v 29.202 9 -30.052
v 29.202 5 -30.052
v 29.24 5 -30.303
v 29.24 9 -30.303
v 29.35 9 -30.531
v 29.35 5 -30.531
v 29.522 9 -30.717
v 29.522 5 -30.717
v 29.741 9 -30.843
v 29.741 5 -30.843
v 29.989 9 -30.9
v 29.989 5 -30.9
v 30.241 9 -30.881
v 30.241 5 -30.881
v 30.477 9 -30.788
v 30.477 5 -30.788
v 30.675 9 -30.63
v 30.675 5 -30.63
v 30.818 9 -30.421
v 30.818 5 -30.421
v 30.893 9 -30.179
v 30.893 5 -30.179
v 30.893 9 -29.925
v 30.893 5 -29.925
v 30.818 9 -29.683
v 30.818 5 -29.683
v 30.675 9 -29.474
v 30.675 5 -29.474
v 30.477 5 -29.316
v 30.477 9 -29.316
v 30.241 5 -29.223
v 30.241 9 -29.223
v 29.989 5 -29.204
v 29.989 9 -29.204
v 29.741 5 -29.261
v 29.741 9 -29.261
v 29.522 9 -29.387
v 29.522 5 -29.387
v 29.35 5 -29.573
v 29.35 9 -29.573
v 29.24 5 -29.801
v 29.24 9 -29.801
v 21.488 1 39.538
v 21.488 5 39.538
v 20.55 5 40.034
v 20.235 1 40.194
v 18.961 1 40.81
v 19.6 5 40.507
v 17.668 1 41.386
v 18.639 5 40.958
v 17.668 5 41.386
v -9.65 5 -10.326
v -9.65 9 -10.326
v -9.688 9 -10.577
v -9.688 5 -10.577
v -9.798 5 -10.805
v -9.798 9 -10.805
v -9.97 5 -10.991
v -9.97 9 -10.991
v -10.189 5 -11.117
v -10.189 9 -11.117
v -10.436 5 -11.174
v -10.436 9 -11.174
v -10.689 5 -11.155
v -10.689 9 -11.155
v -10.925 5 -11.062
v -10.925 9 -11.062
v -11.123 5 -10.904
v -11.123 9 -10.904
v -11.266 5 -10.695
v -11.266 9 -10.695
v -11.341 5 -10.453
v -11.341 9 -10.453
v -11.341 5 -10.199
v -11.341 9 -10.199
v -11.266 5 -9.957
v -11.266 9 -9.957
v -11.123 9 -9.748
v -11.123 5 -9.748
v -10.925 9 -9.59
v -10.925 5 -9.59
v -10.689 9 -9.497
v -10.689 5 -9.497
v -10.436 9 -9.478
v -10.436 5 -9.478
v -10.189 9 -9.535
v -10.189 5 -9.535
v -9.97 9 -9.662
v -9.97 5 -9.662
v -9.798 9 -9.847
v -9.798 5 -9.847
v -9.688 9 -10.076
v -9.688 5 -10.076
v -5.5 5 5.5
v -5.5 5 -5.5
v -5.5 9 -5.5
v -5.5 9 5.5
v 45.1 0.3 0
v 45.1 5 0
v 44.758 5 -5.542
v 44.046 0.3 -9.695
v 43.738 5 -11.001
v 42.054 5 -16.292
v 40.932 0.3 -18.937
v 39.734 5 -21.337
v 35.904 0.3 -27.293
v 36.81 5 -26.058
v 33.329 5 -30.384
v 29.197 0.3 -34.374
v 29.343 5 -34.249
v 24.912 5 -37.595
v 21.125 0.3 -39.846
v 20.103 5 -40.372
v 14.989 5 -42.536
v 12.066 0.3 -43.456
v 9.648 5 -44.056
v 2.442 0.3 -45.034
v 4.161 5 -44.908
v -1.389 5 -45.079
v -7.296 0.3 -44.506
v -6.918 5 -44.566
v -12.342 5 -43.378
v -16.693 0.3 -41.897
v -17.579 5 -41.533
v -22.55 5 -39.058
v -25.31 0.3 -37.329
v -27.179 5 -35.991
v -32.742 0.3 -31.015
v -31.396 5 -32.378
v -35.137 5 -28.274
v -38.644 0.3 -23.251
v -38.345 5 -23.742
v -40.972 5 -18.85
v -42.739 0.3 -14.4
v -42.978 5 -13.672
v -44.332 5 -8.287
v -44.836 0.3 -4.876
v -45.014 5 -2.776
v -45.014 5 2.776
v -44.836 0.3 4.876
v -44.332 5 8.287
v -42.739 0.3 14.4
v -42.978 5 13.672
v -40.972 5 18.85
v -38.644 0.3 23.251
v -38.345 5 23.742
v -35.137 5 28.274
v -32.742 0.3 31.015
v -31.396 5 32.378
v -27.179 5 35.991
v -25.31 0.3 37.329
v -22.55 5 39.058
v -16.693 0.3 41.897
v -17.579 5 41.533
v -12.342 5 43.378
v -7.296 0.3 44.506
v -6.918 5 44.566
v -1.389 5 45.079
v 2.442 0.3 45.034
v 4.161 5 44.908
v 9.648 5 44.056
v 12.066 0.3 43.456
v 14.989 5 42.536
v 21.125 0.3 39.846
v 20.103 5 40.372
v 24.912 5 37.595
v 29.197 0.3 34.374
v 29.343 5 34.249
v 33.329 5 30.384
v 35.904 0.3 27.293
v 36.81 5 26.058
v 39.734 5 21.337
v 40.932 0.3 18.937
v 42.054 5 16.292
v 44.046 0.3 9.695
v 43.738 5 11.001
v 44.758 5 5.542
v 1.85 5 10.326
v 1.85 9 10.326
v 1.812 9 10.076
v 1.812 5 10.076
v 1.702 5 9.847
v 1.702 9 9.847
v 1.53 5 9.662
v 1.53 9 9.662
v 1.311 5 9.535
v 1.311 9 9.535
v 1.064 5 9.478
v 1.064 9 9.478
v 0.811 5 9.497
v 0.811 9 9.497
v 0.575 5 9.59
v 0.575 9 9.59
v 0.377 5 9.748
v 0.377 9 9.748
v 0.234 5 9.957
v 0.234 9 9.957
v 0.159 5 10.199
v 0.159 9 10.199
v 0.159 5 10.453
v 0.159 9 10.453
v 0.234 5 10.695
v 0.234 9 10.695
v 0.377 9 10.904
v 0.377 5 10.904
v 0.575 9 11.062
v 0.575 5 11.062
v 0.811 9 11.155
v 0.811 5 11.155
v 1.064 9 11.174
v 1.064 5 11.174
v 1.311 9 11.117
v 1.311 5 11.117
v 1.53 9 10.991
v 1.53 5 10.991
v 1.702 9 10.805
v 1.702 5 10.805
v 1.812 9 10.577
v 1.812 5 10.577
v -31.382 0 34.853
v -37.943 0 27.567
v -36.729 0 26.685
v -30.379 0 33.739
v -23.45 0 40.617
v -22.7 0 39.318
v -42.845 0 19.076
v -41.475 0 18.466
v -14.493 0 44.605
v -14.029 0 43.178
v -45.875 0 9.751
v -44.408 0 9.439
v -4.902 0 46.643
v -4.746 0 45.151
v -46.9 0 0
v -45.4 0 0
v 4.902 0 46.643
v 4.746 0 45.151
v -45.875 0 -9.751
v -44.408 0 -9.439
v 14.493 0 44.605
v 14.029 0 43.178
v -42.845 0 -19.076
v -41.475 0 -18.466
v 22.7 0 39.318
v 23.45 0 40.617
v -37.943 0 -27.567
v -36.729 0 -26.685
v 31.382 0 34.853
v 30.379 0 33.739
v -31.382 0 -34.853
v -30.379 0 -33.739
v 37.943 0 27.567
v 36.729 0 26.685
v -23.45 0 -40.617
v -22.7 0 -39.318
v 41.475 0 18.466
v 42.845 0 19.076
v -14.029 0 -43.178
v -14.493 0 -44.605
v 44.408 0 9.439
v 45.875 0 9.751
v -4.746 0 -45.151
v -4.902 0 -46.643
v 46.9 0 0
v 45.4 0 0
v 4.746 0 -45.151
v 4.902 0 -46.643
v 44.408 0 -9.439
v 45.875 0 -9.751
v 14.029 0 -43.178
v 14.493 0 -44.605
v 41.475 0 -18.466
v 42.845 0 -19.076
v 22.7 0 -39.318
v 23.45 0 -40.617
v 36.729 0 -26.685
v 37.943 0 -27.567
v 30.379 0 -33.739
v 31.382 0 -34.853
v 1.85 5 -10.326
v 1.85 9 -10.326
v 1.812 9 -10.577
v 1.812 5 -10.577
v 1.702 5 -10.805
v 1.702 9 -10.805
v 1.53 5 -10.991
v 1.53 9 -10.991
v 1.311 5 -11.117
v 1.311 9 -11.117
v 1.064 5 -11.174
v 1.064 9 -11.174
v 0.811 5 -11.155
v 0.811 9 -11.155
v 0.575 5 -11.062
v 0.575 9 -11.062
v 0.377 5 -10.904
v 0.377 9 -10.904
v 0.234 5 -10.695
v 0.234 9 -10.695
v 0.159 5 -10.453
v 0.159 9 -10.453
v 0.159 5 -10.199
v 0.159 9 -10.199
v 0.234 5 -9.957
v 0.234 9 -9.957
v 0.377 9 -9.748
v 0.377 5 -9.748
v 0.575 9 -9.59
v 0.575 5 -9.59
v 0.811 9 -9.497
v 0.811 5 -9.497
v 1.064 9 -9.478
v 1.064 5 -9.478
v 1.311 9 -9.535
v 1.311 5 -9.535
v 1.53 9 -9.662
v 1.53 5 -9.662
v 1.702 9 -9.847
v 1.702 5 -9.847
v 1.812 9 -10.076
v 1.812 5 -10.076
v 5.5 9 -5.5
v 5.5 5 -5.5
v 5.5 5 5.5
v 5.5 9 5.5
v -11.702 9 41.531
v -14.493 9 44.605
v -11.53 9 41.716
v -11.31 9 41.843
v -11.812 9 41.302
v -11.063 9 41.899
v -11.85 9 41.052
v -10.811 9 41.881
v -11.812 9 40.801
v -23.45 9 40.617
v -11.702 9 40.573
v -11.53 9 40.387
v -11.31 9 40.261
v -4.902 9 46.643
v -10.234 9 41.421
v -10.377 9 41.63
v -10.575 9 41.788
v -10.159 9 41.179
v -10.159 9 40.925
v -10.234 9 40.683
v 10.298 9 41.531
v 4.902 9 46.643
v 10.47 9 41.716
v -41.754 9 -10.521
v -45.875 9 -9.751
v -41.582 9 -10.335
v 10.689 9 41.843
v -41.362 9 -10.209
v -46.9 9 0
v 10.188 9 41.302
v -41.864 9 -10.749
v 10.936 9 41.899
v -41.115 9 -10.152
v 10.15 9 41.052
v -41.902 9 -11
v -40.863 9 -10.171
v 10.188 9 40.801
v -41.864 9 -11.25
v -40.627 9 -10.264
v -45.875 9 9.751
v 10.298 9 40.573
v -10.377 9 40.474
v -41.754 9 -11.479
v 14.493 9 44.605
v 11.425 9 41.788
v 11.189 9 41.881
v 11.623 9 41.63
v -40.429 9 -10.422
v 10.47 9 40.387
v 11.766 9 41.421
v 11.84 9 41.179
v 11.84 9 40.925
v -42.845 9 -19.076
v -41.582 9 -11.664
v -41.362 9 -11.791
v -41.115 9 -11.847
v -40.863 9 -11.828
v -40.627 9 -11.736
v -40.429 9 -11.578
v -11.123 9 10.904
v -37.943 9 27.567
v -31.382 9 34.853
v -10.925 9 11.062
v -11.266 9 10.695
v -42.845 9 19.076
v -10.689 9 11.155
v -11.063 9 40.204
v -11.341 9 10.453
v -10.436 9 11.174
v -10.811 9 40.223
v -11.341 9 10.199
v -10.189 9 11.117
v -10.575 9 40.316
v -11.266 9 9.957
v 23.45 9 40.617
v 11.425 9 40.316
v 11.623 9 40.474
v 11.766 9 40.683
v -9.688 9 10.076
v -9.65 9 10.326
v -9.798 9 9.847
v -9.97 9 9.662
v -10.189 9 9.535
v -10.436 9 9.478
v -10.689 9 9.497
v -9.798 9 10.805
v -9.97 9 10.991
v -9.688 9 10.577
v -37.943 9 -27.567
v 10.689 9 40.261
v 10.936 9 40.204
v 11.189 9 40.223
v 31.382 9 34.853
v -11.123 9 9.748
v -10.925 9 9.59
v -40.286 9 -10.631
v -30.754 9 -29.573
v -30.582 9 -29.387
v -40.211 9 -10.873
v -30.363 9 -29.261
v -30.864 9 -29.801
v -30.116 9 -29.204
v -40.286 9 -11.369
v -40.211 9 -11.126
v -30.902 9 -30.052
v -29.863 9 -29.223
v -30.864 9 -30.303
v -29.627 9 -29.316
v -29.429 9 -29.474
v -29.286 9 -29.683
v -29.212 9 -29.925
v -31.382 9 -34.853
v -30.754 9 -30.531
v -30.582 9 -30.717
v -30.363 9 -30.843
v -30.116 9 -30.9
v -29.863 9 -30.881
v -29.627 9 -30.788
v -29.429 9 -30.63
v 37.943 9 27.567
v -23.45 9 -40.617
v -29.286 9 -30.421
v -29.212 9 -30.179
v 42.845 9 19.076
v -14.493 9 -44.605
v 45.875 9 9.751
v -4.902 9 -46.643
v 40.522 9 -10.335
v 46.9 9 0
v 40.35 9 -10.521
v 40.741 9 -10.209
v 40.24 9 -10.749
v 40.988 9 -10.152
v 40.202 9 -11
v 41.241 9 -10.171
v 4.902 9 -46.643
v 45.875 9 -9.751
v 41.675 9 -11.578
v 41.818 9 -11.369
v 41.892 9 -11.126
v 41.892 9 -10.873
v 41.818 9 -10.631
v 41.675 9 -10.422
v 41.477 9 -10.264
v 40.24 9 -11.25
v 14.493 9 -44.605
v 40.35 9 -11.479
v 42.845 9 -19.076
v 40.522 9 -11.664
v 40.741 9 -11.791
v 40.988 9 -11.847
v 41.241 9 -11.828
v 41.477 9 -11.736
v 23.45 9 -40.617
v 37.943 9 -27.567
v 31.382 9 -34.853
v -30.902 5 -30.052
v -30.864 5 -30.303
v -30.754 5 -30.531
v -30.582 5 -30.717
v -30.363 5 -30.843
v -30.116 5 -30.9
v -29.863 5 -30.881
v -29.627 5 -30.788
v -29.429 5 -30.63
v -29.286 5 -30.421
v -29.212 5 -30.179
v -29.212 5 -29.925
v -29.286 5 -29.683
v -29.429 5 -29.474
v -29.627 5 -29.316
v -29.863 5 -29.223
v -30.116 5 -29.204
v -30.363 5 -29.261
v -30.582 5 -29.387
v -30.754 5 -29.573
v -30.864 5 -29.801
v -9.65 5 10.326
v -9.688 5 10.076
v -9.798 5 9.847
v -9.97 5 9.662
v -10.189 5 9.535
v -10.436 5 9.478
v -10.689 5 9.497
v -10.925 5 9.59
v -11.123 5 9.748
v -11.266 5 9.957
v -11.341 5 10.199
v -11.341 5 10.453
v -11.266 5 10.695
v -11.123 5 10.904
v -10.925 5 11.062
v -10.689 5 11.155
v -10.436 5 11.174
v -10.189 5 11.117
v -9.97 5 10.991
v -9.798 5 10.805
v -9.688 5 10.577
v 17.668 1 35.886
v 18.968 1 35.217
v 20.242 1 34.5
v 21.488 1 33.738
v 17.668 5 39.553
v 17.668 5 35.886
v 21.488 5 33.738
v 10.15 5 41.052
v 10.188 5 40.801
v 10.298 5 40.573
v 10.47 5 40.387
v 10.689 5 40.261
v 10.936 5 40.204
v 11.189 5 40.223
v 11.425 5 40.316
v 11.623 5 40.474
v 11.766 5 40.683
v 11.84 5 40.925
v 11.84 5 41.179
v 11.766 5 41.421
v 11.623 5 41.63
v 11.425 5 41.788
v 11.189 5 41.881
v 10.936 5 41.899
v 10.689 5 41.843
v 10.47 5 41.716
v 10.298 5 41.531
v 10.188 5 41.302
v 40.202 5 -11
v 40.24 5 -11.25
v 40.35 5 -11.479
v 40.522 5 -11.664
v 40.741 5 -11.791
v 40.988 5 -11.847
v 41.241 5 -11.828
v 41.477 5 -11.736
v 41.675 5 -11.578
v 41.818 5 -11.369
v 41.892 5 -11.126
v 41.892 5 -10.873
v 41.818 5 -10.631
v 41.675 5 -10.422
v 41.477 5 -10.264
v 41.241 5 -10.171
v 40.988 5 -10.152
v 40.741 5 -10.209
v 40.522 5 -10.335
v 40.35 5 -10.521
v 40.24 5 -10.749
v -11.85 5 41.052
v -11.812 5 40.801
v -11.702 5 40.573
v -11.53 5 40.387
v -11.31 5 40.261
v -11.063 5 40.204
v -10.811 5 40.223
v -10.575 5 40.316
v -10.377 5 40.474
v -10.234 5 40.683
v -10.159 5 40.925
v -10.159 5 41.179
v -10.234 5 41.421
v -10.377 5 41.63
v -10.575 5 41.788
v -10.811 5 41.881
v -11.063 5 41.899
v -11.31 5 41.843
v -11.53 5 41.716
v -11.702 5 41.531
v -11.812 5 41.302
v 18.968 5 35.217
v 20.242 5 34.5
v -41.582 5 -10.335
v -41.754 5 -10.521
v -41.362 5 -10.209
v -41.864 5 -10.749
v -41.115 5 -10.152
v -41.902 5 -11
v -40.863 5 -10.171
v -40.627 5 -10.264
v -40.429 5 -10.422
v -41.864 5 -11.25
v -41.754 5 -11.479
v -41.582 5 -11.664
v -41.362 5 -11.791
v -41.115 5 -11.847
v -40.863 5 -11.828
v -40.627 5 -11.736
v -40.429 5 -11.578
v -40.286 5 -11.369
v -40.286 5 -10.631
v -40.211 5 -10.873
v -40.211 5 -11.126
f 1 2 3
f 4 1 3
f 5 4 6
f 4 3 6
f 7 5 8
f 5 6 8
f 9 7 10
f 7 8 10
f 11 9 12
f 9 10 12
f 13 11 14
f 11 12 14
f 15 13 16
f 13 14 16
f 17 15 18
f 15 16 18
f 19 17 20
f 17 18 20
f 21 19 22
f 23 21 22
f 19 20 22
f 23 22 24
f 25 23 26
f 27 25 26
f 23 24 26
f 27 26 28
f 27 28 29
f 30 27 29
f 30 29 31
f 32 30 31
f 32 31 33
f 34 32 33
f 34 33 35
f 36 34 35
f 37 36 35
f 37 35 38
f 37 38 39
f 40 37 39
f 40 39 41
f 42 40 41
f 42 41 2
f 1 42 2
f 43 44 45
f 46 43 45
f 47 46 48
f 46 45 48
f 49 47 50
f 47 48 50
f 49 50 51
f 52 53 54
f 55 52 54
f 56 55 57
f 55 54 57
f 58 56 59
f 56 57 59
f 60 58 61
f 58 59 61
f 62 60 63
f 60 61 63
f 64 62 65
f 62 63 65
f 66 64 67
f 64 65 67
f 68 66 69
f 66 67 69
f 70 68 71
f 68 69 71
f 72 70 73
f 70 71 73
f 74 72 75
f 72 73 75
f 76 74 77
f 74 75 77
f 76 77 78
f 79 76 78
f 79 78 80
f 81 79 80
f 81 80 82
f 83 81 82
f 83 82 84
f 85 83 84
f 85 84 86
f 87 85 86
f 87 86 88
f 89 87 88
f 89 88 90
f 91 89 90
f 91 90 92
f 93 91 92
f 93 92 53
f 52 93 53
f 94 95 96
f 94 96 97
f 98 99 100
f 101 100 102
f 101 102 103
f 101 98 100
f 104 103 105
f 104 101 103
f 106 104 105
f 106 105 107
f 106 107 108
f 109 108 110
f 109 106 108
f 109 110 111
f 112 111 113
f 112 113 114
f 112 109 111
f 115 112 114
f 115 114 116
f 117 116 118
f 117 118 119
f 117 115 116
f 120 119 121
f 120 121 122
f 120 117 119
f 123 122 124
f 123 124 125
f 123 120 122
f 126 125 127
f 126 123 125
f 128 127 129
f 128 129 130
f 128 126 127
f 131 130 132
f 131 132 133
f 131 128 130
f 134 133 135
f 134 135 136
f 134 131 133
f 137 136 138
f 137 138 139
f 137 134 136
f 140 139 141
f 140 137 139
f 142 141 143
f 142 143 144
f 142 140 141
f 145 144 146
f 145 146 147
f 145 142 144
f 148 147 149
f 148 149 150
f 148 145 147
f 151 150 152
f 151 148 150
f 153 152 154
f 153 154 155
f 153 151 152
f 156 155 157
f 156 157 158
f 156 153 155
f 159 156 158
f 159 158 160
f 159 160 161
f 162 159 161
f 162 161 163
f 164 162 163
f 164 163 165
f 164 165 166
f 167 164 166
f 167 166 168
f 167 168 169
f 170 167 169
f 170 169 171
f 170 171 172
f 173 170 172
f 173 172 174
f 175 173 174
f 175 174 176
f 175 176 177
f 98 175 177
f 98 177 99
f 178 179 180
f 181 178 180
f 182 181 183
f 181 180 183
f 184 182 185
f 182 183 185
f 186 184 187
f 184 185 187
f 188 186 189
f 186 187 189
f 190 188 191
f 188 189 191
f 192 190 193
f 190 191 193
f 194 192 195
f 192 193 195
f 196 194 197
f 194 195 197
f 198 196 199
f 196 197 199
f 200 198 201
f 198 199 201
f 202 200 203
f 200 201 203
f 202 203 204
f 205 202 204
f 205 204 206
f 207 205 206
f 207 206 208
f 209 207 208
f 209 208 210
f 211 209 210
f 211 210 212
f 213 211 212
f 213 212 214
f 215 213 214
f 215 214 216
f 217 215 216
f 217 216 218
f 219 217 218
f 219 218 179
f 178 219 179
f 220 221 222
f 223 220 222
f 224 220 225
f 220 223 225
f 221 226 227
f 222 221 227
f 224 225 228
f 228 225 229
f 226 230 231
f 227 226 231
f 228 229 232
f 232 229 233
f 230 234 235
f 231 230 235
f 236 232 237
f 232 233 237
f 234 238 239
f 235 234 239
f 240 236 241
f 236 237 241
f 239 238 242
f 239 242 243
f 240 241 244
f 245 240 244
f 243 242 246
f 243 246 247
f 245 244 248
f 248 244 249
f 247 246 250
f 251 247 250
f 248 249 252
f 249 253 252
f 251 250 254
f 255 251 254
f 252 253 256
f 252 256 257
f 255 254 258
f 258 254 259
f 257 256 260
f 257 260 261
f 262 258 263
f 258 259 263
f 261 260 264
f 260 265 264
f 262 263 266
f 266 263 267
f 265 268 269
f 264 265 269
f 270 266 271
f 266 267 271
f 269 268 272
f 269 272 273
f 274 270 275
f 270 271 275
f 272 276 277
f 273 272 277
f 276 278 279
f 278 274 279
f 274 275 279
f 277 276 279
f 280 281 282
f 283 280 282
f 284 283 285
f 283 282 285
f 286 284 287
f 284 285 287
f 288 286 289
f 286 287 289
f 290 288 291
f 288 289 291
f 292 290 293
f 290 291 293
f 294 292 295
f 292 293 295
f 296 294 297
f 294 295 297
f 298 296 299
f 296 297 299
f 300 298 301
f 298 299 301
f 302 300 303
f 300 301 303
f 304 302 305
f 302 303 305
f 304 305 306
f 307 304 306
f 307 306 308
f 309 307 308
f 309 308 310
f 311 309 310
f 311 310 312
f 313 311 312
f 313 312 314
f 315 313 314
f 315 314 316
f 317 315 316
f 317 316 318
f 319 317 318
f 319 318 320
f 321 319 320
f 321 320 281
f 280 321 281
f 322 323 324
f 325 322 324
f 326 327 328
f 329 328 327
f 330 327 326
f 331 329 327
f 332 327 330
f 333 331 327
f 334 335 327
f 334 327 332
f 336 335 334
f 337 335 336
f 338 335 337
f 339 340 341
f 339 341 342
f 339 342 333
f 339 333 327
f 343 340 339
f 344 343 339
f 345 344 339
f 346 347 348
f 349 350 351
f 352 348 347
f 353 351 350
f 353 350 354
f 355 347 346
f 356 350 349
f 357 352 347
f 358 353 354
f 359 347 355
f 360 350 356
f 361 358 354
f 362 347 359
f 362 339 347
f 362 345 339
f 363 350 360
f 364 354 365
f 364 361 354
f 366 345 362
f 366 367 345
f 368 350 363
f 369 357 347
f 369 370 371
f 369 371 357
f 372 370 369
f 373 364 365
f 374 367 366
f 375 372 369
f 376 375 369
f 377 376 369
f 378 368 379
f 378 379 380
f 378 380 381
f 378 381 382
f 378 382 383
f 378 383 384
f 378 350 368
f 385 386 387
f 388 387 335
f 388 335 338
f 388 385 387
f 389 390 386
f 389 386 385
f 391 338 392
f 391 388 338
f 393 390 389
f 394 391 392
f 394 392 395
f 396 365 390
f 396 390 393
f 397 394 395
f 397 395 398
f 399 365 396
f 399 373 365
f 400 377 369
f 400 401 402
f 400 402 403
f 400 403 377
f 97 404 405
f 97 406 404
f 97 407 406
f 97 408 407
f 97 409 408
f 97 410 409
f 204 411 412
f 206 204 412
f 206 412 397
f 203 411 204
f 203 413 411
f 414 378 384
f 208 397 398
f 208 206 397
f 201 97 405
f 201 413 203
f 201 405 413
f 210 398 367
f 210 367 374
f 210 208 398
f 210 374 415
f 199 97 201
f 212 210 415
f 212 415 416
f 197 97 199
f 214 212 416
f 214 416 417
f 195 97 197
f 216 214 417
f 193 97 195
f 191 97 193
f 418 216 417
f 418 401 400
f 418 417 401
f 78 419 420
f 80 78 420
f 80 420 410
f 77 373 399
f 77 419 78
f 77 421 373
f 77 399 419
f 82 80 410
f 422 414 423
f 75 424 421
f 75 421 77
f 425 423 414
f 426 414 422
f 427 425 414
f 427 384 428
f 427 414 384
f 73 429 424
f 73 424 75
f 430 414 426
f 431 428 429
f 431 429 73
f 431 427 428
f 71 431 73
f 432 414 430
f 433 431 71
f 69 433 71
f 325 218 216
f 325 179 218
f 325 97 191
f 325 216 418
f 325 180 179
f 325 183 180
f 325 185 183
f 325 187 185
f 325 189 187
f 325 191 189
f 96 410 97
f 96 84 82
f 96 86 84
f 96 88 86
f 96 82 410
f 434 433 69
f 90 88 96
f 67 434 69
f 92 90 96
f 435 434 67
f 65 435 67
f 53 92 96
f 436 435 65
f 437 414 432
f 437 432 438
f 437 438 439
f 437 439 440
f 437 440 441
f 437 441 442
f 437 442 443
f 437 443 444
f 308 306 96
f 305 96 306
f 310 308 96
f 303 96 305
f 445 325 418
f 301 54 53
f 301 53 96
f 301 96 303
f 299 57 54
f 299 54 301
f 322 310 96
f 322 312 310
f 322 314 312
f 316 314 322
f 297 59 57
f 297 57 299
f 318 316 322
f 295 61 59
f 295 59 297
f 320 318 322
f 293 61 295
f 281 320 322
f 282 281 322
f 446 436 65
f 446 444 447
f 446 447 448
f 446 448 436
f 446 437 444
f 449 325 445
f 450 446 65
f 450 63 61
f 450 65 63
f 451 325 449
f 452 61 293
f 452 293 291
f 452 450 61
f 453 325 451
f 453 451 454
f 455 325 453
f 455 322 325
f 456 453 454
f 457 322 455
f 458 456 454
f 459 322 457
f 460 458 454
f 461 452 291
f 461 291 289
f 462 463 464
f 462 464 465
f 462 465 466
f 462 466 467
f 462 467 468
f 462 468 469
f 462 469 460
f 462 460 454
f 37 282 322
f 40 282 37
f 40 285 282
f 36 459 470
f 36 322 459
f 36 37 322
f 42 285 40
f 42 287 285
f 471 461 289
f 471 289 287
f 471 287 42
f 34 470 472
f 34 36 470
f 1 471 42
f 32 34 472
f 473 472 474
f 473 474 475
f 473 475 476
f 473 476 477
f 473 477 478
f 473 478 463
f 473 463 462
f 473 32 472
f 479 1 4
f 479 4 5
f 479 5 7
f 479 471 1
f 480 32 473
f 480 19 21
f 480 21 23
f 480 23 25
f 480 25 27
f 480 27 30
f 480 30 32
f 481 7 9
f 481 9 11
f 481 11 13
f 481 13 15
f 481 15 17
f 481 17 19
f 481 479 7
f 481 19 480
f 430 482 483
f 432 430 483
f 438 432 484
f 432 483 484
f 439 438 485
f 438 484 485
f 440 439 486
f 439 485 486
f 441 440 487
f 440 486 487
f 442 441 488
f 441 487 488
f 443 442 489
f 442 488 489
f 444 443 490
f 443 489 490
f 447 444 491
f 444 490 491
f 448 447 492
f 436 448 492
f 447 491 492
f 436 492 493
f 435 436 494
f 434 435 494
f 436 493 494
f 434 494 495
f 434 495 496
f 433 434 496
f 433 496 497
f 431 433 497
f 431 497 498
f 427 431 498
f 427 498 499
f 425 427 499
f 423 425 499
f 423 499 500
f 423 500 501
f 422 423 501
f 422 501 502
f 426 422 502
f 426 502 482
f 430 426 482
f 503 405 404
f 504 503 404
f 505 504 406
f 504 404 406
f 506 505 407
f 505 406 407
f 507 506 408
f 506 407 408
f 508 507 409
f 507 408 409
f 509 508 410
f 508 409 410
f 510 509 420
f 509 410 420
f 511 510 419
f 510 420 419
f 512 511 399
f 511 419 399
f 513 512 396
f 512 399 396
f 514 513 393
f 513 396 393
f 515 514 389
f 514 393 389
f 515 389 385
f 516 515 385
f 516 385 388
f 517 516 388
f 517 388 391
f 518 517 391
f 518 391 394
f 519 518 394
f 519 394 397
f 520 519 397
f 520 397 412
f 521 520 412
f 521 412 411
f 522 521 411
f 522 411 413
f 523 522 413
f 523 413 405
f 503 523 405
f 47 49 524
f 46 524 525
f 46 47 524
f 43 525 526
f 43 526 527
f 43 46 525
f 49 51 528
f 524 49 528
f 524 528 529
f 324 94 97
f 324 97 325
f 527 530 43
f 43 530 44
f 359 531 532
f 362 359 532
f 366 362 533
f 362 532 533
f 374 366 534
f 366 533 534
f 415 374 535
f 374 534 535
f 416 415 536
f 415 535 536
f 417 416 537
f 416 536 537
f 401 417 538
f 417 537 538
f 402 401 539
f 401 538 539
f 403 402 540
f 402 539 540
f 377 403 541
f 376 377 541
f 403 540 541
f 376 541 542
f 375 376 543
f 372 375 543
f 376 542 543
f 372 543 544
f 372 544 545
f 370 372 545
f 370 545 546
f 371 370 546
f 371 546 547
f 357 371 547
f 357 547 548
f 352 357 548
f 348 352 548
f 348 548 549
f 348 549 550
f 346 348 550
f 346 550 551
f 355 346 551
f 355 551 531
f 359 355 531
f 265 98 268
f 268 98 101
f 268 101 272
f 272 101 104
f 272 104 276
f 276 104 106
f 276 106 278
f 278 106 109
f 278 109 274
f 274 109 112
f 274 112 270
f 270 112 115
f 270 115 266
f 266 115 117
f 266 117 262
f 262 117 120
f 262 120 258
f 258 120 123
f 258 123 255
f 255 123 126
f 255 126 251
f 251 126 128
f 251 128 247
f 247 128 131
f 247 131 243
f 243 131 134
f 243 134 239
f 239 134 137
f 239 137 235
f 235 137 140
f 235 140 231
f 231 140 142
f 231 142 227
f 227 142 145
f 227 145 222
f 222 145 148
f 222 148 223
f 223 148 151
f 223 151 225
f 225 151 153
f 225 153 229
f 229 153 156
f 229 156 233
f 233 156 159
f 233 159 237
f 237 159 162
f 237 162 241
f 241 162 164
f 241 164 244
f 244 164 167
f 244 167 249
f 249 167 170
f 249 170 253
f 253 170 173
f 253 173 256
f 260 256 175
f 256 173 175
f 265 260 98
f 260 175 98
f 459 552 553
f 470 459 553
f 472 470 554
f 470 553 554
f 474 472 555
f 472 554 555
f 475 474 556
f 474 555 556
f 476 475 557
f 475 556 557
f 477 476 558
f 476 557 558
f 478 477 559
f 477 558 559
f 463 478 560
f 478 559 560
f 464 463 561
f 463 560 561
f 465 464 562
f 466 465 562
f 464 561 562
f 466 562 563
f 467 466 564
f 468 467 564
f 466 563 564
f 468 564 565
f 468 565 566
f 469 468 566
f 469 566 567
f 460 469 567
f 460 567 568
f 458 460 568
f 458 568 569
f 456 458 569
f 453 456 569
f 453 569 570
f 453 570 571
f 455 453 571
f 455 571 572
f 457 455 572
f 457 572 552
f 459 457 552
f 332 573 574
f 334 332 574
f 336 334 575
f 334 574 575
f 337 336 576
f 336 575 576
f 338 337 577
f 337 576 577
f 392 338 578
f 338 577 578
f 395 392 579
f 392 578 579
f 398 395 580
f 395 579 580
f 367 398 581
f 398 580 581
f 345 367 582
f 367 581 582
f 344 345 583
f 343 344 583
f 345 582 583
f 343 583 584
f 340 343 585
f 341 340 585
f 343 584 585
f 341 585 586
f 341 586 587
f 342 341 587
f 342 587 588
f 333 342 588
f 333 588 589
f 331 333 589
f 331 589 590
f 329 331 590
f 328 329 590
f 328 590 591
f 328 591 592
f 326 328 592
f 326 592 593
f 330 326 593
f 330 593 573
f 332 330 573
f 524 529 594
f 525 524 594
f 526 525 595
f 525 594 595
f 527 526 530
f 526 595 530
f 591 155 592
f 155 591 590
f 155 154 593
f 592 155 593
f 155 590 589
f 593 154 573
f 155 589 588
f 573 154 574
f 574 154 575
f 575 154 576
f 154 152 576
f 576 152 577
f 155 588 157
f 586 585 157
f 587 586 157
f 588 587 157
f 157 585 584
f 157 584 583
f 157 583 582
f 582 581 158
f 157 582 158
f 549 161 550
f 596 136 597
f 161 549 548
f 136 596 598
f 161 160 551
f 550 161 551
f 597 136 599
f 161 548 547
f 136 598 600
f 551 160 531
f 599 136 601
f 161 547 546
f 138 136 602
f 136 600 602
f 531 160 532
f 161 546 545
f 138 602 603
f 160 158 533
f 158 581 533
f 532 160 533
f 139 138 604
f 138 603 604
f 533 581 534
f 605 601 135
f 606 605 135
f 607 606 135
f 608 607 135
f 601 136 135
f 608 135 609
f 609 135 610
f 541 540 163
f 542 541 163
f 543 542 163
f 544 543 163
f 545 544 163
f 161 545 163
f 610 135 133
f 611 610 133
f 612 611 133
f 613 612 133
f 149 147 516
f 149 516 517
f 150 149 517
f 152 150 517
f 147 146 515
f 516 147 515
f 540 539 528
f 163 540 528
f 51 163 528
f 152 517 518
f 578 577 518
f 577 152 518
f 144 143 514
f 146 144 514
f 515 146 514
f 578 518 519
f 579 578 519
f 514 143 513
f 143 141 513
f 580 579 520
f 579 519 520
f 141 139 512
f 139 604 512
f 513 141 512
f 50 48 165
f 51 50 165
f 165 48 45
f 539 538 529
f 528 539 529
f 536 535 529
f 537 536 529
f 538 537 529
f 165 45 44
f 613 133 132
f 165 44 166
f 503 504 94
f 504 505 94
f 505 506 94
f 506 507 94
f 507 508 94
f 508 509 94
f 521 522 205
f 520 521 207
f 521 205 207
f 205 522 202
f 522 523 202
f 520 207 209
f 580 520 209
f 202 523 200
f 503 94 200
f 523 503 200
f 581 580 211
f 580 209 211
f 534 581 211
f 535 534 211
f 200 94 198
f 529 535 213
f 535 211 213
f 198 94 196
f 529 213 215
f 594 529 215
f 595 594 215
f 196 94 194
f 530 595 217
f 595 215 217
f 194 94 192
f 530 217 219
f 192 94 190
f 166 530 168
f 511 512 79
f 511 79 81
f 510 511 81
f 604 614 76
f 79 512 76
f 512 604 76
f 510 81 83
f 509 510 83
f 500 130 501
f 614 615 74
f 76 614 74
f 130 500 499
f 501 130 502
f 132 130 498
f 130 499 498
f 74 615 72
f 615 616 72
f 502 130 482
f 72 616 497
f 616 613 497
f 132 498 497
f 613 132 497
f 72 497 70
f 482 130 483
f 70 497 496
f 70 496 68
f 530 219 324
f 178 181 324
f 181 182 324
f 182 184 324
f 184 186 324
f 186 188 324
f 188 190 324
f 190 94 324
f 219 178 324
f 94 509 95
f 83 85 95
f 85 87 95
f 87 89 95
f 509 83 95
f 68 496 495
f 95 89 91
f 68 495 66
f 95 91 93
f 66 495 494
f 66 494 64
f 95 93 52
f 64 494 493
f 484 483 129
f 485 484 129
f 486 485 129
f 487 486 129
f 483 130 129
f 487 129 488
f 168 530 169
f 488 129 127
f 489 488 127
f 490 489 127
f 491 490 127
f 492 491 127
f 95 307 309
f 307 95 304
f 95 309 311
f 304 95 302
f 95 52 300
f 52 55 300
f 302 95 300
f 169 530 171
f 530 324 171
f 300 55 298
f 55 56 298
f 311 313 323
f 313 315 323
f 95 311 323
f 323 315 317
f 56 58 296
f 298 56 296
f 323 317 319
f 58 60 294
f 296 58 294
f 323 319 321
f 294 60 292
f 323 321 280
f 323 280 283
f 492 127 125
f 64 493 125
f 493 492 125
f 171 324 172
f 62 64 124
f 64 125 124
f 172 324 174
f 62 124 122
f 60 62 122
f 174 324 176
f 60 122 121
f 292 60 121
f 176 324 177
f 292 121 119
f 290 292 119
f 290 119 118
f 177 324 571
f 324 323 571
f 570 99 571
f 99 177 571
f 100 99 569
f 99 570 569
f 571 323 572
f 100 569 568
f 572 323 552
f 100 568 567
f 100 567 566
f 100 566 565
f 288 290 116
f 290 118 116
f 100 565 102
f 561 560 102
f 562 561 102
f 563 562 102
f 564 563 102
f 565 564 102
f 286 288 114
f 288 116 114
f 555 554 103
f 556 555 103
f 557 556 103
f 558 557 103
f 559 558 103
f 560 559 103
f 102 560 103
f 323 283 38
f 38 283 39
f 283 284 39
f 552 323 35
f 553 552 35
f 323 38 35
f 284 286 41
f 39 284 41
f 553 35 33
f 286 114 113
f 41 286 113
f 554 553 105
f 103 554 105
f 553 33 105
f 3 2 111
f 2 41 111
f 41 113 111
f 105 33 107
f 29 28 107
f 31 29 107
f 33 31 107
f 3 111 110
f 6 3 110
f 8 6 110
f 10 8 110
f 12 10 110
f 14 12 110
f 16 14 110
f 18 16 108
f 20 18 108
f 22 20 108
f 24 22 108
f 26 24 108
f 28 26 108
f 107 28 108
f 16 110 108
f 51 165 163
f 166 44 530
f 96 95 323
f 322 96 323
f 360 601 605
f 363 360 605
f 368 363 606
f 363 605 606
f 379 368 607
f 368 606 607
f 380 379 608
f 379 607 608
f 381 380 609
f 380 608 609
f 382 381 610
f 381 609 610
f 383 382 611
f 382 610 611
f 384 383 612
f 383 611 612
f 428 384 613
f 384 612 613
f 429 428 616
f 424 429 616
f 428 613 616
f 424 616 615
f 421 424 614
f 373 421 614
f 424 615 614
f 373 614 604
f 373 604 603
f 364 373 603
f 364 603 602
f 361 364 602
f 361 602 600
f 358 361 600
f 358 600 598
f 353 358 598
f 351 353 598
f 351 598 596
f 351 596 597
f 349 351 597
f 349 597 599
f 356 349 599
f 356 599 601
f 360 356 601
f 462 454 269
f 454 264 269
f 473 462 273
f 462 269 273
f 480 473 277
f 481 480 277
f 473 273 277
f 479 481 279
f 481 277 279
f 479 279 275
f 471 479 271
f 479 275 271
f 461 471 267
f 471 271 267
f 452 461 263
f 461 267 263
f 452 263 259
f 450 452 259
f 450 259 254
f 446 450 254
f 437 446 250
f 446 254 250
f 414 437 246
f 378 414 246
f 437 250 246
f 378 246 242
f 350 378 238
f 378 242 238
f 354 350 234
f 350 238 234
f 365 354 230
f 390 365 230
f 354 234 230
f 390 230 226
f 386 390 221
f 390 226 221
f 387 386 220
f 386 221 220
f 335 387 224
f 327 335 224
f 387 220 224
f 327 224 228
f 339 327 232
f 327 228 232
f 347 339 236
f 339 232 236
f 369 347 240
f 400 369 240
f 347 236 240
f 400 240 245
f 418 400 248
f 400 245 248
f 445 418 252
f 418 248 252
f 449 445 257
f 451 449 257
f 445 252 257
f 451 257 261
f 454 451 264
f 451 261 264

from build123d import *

# Parameters (mm, degrees)
SKETCH_1_R          = 46.9
SKETCH_1_R_2        = 45.1
EXTRUDE_2_DEPTH     = 5
SKETCH_2_R          = 46.9
EXTRUDE_1_DEPTH     = 4
SKETCH_4_W          = 11
SKETCH_4_H          = 11
CUT_EXTRUDE_1_DEPTH = 67.514810381
HOLE_WIZARD_2_D     = 1.7
HOLE_WIZARD_2_DEPTH = 4.4
CHAMFER_1_SIZE      = 0.3
HOLE_WIZARD_1_D     = 1.7
EXTRUDE_2_2_DEPTH   = 4


with BuildPart() as part:
    # 草图1 → Extrude 2 (new body)
    with BuildSketch(Plane(origin=(0, 0, 0), x_dir=(1, 0, 0), z_dir=(0, 1, 0))):
        Circle(SKETCH_1_R)
        Circle(SKETCH_1_R_2, mode=Mode.SUBTRACT)
    extrude(amount=EXTRUDE_2_DEPTH)

    # 草图2 → 凸台-拉伸1 (add)
    with BuildSketch(Plane(origin=(0, 5, 0), x_dir=(1, 0, 0), z_dir=(0, 1, 0))):
        Circle(SKETCH_2_R)
    extrude(amount=EXTRUDE_1_DEPTH)

    # 草图4 → 切除-拉伸1 (cut, through all)
    with BuildSketch(Plane.XZ.offset(-5)):
        Rectangle(SKETCH_4_W, SKETCH_4_H)
    extrude(amount=-CUT_EXTRUDE_1_DEPTH, mode=Mode.SUBTRACT)

    # 孔2
    with Locations(Plane(origin=(0, 5, 0), x_dir=(-1, 0, 0), z_dir=(0, -1, 0))):
        with Locations((-1, 10.326086957), (10.5, 10.326086957), (10.5, -10.326086957), (-1, -10.326086957)):
            Hole(HOLE_WIZARD_2_D / 2, depth=HOLE_WIZARD_2_DEPTH)

    # 倒角1
    chamfer_1_edges = [part.edges().sort_by_distance(p)[0] for p in [
        (-45.1, 0, 0),
    ]]
    chamfer(chamfer_1_edges, length=CHAMFER_1_SIZE)

    # 孔1 (through all)
    with Locations(Plane(origin=(0, 9, 0), x_dir=(1, 0, 0), z_dir=(0, 1, 0))):
        with Locations((-41.051847617, 10.999809417), (-30.0520382, 30.0520382), (30.0520382, 30.0520382), (41.051847617, 10.999809417), (10.999809417, -41.051847617), (-10.999809417, -41.051847617)):
            Hole(HOLE_WIZARD_1_D / 2)

    # 草图20 → Extrude 2 2 (add)
    with BuildSketch(Plane.XZ.offset(-5)):
        with BuildLine():
            Line((17.668302266, 41.386363636), (17.668302266, 35.886363636))
            ThreePointArc((17.668302266, 35.886363636), (19.60780664, 34.86450801), (21.488415705, 33.737931034))
            Line((21.488415705, 33.737931034), (21.488415705, 39.537931034))
            ThreePointArc((21.488415705, 39.537931034), (19.60016113, 40.50720533), (17.668302266, 41.386363636))
        make_face()
    extrude(amount=EXTRUDE_2_2_DEPTH)


solid = part.part
